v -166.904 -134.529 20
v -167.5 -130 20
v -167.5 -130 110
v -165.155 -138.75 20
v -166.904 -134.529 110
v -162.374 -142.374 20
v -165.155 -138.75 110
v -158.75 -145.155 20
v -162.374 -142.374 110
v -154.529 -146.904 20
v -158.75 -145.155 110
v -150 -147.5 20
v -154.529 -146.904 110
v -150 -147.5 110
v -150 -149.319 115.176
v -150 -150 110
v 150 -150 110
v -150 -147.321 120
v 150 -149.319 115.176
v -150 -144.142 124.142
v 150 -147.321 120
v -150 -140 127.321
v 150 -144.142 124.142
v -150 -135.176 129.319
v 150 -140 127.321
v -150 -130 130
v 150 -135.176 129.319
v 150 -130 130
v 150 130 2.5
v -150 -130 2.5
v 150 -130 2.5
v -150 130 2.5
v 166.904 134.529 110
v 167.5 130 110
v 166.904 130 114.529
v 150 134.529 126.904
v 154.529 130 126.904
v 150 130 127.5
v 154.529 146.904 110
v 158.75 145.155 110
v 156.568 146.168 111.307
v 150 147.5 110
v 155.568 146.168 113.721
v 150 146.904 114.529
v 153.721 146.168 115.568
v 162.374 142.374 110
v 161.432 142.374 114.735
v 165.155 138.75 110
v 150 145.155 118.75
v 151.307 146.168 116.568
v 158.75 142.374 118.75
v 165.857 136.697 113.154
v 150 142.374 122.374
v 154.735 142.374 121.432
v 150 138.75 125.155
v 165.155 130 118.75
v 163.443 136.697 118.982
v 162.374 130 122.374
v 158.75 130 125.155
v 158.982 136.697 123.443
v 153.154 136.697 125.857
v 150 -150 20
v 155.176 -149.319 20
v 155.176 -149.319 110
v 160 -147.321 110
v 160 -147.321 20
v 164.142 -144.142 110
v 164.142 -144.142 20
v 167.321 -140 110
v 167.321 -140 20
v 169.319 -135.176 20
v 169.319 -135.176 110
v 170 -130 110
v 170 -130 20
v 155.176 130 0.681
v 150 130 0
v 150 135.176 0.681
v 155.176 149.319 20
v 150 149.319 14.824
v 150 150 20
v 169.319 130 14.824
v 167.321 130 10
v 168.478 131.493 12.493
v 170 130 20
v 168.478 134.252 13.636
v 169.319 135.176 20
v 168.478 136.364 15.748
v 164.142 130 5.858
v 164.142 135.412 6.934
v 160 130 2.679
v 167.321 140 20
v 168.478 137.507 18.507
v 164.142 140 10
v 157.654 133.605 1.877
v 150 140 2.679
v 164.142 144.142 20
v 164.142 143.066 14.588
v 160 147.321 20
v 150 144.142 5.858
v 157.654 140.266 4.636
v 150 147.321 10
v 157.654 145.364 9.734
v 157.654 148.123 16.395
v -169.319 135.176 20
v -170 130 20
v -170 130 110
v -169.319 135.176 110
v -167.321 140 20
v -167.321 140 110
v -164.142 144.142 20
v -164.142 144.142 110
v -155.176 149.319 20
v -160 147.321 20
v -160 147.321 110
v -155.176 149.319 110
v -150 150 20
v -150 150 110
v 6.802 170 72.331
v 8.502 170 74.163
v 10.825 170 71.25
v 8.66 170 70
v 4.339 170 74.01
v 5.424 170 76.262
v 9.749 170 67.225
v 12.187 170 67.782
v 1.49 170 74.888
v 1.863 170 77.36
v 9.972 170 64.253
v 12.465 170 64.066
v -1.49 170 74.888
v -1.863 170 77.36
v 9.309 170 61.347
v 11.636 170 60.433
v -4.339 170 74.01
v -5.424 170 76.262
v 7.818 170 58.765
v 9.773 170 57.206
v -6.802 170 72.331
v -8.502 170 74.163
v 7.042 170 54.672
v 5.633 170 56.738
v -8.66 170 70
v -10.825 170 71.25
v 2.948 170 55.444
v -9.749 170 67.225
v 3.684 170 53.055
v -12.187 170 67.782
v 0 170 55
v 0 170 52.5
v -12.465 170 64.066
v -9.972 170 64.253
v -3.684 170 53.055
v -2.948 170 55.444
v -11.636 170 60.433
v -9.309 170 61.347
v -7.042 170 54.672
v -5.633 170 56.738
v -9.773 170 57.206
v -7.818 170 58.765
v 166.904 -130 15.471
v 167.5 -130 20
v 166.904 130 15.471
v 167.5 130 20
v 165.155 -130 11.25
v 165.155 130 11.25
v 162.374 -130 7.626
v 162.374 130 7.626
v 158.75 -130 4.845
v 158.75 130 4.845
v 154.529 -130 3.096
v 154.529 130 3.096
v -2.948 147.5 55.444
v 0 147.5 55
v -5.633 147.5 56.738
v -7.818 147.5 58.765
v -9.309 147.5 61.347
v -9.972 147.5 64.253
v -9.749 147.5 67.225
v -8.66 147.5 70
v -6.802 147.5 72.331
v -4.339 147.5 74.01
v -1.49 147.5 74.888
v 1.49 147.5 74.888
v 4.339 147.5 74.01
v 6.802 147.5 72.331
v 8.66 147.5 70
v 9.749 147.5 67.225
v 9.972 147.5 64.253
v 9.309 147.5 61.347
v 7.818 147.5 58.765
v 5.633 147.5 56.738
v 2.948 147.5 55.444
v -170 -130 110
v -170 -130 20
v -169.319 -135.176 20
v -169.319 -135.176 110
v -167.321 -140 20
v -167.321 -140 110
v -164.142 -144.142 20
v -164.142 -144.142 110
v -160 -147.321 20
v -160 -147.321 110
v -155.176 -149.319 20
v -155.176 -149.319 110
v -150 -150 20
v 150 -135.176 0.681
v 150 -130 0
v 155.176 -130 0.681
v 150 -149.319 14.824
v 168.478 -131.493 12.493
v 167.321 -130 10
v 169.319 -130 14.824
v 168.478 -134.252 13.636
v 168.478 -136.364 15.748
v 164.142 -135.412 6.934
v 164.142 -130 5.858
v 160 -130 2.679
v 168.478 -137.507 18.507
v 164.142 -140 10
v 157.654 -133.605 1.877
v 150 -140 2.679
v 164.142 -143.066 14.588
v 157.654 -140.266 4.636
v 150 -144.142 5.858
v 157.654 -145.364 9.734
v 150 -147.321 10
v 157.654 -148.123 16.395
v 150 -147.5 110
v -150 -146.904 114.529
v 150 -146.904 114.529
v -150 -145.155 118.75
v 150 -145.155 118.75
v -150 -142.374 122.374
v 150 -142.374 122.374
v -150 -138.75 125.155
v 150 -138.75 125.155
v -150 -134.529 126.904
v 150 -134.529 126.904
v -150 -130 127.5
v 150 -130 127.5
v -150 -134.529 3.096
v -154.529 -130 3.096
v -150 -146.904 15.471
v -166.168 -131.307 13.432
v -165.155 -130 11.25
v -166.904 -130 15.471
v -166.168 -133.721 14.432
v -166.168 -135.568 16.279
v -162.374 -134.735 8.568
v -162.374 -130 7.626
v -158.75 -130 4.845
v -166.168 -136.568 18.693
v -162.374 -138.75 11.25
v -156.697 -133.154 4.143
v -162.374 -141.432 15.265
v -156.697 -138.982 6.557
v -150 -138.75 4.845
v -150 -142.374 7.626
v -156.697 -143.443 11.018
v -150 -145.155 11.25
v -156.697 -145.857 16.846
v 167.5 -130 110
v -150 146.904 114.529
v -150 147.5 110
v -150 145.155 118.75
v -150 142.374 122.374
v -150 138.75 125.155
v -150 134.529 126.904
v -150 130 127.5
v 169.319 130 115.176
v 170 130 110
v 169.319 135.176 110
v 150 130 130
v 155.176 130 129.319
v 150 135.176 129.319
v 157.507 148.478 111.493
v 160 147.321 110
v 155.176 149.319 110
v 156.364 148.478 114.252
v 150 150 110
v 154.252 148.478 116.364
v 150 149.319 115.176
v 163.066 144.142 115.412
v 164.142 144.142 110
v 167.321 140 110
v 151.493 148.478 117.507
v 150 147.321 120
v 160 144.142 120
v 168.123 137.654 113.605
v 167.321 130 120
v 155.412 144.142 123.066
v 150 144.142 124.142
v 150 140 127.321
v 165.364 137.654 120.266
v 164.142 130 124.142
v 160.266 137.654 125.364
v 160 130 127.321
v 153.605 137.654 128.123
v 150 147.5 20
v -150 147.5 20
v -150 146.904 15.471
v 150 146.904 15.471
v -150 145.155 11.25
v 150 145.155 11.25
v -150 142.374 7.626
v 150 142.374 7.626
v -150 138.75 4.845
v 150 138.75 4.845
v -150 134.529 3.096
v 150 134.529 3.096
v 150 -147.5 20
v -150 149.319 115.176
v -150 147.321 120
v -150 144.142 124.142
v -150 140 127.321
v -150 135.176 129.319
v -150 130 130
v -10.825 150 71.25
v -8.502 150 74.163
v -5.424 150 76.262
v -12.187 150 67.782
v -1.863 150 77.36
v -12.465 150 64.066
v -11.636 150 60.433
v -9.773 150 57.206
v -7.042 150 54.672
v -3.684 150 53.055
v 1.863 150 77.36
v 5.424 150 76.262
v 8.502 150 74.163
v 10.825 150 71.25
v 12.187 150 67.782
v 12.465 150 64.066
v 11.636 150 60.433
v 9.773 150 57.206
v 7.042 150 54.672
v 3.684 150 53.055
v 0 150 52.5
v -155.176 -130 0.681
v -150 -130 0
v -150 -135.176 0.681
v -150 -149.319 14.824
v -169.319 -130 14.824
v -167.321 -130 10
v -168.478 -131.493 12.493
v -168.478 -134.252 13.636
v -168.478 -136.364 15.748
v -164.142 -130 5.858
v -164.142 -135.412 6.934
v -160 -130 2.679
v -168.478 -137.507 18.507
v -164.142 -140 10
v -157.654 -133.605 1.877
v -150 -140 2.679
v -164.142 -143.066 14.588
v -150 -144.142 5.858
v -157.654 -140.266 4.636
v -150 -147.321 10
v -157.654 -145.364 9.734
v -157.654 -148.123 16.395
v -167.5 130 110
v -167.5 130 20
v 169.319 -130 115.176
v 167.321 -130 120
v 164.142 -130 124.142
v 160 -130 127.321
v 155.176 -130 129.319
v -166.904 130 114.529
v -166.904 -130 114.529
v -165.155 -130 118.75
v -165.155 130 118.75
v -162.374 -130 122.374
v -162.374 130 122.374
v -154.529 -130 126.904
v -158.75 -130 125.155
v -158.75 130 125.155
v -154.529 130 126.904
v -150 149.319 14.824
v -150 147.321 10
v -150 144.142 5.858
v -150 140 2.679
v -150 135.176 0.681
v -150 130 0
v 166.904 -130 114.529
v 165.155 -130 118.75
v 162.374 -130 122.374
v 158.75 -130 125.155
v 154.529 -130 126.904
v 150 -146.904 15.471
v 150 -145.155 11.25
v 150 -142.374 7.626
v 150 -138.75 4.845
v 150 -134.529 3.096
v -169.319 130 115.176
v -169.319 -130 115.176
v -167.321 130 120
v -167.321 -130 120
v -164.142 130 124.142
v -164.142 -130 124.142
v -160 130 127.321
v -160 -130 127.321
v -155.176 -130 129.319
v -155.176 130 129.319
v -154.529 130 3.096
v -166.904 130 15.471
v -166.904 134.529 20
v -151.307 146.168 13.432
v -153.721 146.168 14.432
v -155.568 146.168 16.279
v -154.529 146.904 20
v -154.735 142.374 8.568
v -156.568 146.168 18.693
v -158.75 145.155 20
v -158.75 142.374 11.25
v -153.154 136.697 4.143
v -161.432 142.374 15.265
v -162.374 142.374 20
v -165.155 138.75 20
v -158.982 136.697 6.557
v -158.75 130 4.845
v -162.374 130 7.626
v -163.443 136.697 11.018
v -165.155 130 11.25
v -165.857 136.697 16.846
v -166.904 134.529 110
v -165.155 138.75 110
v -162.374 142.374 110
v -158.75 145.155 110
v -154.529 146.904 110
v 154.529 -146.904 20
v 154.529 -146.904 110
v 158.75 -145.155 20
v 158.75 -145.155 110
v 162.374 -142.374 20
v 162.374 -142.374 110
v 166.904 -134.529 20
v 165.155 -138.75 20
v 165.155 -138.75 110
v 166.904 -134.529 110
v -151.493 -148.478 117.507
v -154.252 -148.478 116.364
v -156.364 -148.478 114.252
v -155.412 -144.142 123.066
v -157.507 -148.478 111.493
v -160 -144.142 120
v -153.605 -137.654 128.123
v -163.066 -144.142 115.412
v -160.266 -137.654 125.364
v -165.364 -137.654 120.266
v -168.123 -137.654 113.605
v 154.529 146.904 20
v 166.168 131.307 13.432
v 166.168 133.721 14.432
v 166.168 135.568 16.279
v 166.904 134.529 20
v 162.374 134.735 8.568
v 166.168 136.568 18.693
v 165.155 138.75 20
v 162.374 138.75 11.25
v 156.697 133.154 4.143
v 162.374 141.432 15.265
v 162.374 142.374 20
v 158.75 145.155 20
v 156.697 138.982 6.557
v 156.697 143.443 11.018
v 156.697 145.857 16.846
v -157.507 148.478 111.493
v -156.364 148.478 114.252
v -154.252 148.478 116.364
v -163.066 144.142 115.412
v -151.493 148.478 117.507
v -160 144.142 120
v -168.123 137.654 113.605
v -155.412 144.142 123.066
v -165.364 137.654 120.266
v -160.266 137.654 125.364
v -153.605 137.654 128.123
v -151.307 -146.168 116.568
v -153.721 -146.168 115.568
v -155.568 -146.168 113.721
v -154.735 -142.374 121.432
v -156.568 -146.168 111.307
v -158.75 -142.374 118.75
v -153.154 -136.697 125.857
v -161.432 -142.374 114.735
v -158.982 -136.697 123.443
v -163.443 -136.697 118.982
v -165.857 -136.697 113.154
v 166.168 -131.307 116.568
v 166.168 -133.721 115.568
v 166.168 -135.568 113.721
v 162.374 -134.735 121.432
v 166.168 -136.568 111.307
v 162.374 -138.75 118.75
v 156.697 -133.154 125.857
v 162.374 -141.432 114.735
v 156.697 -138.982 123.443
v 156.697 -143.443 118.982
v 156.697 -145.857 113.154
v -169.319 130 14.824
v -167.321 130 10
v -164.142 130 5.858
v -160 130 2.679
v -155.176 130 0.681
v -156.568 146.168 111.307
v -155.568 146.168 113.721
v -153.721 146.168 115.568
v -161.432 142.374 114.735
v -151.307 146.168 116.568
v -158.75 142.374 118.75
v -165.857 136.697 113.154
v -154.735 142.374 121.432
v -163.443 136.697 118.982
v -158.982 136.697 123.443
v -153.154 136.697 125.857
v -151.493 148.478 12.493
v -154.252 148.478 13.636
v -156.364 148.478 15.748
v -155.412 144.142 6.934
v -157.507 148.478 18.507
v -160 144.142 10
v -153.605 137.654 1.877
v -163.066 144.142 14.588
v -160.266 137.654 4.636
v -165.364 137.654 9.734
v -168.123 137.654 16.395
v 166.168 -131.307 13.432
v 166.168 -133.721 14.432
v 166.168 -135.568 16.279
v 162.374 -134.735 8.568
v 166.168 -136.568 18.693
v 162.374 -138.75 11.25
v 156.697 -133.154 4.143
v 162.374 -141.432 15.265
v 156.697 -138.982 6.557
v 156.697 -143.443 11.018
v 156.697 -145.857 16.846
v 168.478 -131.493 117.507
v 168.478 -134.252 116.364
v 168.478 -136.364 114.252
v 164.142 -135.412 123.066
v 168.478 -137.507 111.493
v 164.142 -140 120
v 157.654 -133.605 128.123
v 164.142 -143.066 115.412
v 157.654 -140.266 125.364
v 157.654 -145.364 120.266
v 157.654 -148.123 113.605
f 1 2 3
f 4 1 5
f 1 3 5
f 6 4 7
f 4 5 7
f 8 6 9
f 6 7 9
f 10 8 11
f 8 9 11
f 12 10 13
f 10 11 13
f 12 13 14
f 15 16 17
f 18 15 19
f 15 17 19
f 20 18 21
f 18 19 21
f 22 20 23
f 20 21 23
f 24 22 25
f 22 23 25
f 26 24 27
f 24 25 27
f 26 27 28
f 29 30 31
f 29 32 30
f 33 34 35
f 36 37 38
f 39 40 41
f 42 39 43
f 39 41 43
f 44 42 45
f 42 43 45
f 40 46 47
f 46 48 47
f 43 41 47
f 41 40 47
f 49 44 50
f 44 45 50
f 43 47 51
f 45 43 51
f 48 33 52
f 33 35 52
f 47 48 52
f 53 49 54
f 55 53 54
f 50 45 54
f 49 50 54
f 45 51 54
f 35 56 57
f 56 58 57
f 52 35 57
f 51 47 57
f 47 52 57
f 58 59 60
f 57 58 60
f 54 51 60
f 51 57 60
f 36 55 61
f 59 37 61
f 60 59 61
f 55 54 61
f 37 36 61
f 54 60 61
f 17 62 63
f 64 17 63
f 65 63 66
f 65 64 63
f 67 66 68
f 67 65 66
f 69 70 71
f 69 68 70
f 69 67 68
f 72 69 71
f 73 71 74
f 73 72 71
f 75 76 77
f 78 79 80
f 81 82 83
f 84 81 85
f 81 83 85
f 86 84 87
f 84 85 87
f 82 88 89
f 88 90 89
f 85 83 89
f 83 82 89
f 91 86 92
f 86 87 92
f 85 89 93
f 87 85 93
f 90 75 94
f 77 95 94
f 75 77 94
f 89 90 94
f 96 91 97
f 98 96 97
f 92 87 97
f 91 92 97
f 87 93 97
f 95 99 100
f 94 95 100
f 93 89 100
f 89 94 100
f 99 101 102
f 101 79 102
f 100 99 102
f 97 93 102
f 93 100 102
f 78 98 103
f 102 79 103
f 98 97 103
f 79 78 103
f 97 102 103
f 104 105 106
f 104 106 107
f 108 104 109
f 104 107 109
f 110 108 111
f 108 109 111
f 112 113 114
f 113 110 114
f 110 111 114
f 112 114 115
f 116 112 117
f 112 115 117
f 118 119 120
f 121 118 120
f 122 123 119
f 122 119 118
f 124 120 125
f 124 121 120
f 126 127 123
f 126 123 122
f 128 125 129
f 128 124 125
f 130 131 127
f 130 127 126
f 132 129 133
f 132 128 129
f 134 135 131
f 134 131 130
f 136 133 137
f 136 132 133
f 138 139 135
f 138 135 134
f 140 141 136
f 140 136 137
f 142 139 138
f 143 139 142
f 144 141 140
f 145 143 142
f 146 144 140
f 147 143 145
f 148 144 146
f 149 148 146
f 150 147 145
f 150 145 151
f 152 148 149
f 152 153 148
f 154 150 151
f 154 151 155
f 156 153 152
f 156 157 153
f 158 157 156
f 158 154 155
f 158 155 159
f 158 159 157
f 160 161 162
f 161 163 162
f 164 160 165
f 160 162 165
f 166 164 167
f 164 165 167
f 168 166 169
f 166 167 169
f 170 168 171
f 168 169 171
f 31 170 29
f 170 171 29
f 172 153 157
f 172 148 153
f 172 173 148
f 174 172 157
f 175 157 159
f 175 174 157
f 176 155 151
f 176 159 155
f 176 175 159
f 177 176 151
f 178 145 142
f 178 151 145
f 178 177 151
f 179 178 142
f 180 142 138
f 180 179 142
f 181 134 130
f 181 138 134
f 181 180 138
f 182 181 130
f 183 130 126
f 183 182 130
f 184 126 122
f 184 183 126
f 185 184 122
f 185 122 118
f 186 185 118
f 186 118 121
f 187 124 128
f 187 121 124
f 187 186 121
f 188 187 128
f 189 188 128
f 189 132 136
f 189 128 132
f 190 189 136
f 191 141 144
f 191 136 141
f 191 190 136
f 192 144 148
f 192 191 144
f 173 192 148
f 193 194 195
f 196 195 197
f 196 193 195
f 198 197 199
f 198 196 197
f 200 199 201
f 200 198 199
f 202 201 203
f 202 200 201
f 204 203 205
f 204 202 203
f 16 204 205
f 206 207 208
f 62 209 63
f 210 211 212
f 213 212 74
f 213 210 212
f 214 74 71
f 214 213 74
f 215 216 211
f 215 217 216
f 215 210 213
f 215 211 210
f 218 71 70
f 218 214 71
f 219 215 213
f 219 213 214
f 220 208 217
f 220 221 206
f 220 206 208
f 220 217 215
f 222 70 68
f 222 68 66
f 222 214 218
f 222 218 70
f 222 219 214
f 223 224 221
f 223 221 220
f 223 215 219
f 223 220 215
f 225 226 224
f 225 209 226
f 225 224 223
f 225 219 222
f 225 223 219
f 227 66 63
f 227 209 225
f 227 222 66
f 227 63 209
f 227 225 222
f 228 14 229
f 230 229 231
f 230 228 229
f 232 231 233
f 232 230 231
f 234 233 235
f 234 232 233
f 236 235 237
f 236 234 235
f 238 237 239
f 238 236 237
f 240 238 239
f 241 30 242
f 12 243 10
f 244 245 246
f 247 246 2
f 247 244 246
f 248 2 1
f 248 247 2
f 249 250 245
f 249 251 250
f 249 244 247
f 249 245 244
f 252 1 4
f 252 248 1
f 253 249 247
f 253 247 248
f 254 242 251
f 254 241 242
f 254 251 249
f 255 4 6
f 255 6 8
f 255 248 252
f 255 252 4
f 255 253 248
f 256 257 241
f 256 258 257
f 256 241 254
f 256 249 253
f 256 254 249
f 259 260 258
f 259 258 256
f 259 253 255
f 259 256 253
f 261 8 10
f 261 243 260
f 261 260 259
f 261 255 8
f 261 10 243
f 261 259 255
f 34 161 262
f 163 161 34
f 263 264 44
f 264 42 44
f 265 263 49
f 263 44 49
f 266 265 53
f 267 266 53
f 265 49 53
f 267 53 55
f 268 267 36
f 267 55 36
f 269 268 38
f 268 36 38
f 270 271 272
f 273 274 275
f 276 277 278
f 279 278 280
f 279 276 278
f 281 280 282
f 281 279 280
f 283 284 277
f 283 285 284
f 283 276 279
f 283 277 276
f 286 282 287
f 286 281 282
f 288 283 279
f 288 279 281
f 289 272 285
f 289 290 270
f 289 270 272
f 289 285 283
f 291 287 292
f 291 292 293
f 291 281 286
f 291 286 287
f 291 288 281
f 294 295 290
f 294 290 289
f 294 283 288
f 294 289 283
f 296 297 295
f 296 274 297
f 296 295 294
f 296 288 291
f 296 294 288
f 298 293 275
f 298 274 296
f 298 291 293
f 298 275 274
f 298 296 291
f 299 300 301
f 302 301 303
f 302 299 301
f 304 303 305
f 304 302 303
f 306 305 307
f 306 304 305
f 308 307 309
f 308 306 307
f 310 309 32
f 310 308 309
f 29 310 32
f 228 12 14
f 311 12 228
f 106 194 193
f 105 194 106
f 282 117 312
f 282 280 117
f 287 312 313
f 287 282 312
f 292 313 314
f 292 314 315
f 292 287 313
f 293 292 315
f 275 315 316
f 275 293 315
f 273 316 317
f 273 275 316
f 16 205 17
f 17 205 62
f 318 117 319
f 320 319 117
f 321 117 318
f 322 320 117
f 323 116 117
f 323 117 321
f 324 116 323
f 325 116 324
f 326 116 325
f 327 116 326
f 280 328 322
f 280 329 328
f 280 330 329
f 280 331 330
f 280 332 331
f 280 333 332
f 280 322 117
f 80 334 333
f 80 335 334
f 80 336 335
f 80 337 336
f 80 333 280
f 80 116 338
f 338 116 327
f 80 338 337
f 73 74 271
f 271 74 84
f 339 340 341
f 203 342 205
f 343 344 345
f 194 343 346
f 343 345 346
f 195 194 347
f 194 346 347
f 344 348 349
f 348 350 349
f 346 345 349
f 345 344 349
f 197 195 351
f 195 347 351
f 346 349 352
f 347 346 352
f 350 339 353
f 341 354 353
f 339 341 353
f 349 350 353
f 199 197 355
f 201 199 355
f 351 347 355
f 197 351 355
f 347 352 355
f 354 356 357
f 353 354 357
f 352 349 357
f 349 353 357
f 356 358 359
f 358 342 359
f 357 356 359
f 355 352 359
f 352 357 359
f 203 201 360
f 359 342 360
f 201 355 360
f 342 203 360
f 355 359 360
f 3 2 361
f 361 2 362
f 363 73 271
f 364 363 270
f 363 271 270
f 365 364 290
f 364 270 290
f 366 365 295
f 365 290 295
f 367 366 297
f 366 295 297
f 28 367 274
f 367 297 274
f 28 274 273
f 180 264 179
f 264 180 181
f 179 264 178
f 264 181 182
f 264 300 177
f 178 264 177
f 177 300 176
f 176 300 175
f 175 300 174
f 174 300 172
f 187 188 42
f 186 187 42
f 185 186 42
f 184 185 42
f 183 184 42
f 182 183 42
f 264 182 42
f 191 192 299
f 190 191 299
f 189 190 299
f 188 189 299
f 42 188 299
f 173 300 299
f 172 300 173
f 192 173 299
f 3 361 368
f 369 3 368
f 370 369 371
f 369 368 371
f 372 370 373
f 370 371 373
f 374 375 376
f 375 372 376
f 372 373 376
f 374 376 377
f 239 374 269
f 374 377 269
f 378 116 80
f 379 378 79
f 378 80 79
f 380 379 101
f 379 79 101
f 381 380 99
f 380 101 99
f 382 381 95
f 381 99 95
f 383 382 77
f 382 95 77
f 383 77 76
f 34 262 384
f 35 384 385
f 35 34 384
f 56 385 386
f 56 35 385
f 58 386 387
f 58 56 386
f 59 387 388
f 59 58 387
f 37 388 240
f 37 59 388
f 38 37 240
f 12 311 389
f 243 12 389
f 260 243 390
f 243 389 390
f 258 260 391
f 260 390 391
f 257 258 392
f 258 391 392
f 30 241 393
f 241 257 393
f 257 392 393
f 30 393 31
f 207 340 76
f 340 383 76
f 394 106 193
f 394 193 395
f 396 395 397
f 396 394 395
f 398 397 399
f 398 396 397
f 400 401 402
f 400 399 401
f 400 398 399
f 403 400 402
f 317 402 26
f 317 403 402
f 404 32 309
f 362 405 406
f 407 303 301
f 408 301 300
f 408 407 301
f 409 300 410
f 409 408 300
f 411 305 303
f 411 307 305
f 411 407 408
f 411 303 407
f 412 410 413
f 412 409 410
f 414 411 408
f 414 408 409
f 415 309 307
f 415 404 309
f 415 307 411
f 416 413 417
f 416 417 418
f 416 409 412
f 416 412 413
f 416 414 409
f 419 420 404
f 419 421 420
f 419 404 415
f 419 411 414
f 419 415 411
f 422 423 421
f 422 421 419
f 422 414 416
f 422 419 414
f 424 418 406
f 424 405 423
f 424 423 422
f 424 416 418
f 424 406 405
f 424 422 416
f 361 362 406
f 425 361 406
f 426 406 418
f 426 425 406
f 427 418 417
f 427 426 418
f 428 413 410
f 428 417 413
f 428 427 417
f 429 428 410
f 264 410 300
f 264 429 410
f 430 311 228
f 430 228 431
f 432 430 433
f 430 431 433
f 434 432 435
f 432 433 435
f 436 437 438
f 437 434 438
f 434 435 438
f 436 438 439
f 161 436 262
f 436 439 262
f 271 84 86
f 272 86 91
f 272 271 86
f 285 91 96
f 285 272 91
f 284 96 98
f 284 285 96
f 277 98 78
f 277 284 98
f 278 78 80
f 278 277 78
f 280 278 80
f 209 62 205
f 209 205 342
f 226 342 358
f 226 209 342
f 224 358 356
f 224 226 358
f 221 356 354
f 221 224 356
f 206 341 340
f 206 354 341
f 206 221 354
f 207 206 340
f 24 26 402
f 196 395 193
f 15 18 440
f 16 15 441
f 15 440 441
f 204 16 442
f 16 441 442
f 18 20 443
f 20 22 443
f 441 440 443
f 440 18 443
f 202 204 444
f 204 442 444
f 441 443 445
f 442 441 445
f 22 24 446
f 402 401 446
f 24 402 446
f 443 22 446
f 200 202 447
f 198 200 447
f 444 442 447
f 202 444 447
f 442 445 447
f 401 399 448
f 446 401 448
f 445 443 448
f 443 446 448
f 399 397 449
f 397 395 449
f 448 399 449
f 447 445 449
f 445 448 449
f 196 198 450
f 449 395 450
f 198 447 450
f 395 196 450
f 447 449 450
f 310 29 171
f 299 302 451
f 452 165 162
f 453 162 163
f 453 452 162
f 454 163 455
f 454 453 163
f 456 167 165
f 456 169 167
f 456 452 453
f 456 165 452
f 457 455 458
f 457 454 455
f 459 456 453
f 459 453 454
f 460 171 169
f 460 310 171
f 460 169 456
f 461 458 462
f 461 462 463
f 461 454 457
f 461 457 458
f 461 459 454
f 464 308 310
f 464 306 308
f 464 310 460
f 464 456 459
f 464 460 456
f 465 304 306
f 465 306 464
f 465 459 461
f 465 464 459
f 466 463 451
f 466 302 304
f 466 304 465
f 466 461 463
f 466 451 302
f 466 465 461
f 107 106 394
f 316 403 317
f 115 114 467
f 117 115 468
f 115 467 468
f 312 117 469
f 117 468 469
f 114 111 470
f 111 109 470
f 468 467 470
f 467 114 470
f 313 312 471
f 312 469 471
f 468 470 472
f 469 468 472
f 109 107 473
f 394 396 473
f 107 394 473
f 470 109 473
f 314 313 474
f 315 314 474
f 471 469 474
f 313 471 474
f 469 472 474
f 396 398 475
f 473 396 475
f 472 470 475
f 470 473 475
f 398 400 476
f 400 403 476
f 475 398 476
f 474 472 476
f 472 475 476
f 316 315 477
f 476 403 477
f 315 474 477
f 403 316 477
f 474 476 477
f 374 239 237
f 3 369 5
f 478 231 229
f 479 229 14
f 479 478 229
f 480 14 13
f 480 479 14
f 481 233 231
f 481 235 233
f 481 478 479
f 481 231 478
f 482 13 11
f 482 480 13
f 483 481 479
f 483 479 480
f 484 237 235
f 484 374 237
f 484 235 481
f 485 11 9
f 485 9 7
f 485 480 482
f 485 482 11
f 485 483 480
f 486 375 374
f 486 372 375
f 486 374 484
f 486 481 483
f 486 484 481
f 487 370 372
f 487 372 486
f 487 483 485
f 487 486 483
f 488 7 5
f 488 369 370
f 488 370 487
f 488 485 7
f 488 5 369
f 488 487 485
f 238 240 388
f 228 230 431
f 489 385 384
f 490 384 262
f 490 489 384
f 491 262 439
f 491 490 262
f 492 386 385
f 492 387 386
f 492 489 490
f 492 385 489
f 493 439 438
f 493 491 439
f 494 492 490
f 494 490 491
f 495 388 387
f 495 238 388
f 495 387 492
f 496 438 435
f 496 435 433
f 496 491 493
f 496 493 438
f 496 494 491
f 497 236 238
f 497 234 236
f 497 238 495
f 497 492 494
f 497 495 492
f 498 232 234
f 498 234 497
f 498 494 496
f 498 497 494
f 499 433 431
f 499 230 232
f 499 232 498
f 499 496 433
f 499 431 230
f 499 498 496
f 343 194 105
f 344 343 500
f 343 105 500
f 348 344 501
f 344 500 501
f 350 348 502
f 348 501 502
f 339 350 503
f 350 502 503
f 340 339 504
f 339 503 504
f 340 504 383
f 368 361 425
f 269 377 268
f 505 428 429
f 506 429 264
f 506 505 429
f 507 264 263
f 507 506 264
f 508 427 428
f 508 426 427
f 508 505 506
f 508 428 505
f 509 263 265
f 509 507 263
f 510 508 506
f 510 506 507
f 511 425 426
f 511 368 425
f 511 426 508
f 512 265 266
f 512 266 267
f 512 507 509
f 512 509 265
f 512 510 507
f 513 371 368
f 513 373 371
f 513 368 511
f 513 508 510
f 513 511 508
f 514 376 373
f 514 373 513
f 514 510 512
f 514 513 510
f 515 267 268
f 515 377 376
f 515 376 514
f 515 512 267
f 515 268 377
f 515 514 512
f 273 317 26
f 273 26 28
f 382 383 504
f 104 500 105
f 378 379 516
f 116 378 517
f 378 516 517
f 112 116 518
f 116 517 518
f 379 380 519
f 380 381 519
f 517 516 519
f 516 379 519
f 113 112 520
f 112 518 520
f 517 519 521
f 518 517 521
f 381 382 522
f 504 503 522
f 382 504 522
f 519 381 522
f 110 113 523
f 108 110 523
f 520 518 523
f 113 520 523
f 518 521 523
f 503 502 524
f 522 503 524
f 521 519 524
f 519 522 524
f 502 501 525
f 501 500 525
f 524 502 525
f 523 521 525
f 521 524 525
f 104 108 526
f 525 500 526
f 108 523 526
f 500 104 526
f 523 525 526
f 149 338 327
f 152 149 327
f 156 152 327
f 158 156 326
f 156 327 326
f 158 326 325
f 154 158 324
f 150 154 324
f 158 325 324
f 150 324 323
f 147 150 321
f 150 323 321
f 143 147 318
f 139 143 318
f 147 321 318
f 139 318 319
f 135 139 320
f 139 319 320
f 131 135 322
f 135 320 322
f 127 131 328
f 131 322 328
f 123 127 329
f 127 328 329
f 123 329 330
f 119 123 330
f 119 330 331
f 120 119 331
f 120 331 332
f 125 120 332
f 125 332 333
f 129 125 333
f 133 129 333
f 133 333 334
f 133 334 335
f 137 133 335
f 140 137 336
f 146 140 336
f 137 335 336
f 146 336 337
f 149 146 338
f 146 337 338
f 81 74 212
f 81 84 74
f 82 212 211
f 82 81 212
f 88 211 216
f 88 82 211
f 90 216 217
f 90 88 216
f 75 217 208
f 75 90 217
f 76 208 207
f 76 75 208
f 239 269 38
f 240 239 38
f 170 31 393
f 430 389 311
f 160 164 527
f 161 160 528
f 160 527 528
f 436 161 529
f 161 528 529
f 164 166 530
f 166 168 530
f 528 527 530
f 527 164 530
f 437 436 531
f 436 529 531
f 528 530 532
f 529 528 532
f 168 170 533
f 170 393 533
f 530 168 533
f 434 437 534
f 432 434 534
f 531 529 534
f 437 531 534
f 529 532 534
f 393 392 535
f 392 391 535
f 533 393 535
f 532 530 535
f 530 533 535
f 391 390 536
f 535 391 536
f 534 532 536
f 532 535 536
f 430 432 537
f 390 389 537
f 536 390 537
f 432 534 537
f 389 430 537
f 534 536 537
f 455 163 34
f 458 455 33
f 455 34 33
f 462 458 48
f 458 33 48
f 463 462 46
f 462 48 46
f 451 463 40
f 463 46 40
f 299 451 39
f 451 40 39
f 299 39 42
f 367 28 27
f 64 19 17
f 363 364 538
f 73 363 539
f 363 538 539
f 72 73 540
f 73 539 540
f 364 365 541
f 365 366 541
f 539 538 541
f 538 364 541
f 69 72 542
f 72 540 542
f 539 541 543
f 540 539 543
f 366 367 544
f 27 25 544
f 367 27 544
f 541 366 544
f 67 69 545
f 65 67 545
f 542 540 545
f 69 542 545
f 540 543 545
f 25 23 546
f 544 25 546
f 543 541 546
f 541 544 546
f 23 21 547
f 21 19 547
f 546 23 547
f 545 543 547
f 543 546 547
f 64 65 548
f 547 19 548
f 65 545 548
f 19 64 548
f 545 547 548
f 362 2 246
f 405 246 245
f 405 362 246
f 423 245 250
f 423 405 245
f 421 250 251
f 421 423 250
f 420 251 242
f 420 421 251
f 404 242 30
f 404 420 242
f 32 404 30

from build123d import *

# Parameters (mm, degrees)
SKETCH1_W           = 340
SKETCH1_H           = 300
BOSS_EXTRUDE1_DEPTH = 130
FILLET1_R           = 20
SKETCH2_R           = 12.5
BOSS_EXTRUDE2_DEPTH = 20
SHELL2_T            = -2.5


with BuildPart() as part:
    # Sketch1 → Boss-Extrude1 (new body)
    with BuildSketch(Plane.XY):
        Rectangle(SKETCH1_W, SKETCH1_H)
    extrude(amount=BOSS_EXTRUDE1_DEPTH)

    # Fillet1
    fillet1_edges = [part.edges().sort_by_distance(p)[0] for p in [
        (-170, 0, 130),
        (0, -150, 130),
        (170, 0, 130),
        (0, -150, 0),
        (-170, 0, 0),
        (0, 150, 0),
        (170, 0, 0),
        (170, -150, 65),
        (-170, -150, 65),
        (-170, 150, 65),
        (170, 150, 65),
        (0, 150, 130),
    ]]
    fillet(fillet1_edges, radius=FILLET1_R)

    # Sketch2 → Boss-Extrude2 (add)
    with BuildSketch(Plane(origin=(0, 150, 0), x_dir=(1, 0, 0), z_dir=(0, 1, 0))):
        with Locations(Location((0, -65, 0), (0, 0, 90))):
            Circle(SKETCH2_R)
    extrude(amount=BOSS_EXTRUDE2_DEPTH)

    # Shell2
    shell2_openings = [part.faces().sort_by_distance(p)[0] for p in [
        (0, 170, 65),
    ]]
    offset(amount=SHELL2_T, openings=shell2_openings, kind=Kind.INTERSECTION)


solid = part.part
